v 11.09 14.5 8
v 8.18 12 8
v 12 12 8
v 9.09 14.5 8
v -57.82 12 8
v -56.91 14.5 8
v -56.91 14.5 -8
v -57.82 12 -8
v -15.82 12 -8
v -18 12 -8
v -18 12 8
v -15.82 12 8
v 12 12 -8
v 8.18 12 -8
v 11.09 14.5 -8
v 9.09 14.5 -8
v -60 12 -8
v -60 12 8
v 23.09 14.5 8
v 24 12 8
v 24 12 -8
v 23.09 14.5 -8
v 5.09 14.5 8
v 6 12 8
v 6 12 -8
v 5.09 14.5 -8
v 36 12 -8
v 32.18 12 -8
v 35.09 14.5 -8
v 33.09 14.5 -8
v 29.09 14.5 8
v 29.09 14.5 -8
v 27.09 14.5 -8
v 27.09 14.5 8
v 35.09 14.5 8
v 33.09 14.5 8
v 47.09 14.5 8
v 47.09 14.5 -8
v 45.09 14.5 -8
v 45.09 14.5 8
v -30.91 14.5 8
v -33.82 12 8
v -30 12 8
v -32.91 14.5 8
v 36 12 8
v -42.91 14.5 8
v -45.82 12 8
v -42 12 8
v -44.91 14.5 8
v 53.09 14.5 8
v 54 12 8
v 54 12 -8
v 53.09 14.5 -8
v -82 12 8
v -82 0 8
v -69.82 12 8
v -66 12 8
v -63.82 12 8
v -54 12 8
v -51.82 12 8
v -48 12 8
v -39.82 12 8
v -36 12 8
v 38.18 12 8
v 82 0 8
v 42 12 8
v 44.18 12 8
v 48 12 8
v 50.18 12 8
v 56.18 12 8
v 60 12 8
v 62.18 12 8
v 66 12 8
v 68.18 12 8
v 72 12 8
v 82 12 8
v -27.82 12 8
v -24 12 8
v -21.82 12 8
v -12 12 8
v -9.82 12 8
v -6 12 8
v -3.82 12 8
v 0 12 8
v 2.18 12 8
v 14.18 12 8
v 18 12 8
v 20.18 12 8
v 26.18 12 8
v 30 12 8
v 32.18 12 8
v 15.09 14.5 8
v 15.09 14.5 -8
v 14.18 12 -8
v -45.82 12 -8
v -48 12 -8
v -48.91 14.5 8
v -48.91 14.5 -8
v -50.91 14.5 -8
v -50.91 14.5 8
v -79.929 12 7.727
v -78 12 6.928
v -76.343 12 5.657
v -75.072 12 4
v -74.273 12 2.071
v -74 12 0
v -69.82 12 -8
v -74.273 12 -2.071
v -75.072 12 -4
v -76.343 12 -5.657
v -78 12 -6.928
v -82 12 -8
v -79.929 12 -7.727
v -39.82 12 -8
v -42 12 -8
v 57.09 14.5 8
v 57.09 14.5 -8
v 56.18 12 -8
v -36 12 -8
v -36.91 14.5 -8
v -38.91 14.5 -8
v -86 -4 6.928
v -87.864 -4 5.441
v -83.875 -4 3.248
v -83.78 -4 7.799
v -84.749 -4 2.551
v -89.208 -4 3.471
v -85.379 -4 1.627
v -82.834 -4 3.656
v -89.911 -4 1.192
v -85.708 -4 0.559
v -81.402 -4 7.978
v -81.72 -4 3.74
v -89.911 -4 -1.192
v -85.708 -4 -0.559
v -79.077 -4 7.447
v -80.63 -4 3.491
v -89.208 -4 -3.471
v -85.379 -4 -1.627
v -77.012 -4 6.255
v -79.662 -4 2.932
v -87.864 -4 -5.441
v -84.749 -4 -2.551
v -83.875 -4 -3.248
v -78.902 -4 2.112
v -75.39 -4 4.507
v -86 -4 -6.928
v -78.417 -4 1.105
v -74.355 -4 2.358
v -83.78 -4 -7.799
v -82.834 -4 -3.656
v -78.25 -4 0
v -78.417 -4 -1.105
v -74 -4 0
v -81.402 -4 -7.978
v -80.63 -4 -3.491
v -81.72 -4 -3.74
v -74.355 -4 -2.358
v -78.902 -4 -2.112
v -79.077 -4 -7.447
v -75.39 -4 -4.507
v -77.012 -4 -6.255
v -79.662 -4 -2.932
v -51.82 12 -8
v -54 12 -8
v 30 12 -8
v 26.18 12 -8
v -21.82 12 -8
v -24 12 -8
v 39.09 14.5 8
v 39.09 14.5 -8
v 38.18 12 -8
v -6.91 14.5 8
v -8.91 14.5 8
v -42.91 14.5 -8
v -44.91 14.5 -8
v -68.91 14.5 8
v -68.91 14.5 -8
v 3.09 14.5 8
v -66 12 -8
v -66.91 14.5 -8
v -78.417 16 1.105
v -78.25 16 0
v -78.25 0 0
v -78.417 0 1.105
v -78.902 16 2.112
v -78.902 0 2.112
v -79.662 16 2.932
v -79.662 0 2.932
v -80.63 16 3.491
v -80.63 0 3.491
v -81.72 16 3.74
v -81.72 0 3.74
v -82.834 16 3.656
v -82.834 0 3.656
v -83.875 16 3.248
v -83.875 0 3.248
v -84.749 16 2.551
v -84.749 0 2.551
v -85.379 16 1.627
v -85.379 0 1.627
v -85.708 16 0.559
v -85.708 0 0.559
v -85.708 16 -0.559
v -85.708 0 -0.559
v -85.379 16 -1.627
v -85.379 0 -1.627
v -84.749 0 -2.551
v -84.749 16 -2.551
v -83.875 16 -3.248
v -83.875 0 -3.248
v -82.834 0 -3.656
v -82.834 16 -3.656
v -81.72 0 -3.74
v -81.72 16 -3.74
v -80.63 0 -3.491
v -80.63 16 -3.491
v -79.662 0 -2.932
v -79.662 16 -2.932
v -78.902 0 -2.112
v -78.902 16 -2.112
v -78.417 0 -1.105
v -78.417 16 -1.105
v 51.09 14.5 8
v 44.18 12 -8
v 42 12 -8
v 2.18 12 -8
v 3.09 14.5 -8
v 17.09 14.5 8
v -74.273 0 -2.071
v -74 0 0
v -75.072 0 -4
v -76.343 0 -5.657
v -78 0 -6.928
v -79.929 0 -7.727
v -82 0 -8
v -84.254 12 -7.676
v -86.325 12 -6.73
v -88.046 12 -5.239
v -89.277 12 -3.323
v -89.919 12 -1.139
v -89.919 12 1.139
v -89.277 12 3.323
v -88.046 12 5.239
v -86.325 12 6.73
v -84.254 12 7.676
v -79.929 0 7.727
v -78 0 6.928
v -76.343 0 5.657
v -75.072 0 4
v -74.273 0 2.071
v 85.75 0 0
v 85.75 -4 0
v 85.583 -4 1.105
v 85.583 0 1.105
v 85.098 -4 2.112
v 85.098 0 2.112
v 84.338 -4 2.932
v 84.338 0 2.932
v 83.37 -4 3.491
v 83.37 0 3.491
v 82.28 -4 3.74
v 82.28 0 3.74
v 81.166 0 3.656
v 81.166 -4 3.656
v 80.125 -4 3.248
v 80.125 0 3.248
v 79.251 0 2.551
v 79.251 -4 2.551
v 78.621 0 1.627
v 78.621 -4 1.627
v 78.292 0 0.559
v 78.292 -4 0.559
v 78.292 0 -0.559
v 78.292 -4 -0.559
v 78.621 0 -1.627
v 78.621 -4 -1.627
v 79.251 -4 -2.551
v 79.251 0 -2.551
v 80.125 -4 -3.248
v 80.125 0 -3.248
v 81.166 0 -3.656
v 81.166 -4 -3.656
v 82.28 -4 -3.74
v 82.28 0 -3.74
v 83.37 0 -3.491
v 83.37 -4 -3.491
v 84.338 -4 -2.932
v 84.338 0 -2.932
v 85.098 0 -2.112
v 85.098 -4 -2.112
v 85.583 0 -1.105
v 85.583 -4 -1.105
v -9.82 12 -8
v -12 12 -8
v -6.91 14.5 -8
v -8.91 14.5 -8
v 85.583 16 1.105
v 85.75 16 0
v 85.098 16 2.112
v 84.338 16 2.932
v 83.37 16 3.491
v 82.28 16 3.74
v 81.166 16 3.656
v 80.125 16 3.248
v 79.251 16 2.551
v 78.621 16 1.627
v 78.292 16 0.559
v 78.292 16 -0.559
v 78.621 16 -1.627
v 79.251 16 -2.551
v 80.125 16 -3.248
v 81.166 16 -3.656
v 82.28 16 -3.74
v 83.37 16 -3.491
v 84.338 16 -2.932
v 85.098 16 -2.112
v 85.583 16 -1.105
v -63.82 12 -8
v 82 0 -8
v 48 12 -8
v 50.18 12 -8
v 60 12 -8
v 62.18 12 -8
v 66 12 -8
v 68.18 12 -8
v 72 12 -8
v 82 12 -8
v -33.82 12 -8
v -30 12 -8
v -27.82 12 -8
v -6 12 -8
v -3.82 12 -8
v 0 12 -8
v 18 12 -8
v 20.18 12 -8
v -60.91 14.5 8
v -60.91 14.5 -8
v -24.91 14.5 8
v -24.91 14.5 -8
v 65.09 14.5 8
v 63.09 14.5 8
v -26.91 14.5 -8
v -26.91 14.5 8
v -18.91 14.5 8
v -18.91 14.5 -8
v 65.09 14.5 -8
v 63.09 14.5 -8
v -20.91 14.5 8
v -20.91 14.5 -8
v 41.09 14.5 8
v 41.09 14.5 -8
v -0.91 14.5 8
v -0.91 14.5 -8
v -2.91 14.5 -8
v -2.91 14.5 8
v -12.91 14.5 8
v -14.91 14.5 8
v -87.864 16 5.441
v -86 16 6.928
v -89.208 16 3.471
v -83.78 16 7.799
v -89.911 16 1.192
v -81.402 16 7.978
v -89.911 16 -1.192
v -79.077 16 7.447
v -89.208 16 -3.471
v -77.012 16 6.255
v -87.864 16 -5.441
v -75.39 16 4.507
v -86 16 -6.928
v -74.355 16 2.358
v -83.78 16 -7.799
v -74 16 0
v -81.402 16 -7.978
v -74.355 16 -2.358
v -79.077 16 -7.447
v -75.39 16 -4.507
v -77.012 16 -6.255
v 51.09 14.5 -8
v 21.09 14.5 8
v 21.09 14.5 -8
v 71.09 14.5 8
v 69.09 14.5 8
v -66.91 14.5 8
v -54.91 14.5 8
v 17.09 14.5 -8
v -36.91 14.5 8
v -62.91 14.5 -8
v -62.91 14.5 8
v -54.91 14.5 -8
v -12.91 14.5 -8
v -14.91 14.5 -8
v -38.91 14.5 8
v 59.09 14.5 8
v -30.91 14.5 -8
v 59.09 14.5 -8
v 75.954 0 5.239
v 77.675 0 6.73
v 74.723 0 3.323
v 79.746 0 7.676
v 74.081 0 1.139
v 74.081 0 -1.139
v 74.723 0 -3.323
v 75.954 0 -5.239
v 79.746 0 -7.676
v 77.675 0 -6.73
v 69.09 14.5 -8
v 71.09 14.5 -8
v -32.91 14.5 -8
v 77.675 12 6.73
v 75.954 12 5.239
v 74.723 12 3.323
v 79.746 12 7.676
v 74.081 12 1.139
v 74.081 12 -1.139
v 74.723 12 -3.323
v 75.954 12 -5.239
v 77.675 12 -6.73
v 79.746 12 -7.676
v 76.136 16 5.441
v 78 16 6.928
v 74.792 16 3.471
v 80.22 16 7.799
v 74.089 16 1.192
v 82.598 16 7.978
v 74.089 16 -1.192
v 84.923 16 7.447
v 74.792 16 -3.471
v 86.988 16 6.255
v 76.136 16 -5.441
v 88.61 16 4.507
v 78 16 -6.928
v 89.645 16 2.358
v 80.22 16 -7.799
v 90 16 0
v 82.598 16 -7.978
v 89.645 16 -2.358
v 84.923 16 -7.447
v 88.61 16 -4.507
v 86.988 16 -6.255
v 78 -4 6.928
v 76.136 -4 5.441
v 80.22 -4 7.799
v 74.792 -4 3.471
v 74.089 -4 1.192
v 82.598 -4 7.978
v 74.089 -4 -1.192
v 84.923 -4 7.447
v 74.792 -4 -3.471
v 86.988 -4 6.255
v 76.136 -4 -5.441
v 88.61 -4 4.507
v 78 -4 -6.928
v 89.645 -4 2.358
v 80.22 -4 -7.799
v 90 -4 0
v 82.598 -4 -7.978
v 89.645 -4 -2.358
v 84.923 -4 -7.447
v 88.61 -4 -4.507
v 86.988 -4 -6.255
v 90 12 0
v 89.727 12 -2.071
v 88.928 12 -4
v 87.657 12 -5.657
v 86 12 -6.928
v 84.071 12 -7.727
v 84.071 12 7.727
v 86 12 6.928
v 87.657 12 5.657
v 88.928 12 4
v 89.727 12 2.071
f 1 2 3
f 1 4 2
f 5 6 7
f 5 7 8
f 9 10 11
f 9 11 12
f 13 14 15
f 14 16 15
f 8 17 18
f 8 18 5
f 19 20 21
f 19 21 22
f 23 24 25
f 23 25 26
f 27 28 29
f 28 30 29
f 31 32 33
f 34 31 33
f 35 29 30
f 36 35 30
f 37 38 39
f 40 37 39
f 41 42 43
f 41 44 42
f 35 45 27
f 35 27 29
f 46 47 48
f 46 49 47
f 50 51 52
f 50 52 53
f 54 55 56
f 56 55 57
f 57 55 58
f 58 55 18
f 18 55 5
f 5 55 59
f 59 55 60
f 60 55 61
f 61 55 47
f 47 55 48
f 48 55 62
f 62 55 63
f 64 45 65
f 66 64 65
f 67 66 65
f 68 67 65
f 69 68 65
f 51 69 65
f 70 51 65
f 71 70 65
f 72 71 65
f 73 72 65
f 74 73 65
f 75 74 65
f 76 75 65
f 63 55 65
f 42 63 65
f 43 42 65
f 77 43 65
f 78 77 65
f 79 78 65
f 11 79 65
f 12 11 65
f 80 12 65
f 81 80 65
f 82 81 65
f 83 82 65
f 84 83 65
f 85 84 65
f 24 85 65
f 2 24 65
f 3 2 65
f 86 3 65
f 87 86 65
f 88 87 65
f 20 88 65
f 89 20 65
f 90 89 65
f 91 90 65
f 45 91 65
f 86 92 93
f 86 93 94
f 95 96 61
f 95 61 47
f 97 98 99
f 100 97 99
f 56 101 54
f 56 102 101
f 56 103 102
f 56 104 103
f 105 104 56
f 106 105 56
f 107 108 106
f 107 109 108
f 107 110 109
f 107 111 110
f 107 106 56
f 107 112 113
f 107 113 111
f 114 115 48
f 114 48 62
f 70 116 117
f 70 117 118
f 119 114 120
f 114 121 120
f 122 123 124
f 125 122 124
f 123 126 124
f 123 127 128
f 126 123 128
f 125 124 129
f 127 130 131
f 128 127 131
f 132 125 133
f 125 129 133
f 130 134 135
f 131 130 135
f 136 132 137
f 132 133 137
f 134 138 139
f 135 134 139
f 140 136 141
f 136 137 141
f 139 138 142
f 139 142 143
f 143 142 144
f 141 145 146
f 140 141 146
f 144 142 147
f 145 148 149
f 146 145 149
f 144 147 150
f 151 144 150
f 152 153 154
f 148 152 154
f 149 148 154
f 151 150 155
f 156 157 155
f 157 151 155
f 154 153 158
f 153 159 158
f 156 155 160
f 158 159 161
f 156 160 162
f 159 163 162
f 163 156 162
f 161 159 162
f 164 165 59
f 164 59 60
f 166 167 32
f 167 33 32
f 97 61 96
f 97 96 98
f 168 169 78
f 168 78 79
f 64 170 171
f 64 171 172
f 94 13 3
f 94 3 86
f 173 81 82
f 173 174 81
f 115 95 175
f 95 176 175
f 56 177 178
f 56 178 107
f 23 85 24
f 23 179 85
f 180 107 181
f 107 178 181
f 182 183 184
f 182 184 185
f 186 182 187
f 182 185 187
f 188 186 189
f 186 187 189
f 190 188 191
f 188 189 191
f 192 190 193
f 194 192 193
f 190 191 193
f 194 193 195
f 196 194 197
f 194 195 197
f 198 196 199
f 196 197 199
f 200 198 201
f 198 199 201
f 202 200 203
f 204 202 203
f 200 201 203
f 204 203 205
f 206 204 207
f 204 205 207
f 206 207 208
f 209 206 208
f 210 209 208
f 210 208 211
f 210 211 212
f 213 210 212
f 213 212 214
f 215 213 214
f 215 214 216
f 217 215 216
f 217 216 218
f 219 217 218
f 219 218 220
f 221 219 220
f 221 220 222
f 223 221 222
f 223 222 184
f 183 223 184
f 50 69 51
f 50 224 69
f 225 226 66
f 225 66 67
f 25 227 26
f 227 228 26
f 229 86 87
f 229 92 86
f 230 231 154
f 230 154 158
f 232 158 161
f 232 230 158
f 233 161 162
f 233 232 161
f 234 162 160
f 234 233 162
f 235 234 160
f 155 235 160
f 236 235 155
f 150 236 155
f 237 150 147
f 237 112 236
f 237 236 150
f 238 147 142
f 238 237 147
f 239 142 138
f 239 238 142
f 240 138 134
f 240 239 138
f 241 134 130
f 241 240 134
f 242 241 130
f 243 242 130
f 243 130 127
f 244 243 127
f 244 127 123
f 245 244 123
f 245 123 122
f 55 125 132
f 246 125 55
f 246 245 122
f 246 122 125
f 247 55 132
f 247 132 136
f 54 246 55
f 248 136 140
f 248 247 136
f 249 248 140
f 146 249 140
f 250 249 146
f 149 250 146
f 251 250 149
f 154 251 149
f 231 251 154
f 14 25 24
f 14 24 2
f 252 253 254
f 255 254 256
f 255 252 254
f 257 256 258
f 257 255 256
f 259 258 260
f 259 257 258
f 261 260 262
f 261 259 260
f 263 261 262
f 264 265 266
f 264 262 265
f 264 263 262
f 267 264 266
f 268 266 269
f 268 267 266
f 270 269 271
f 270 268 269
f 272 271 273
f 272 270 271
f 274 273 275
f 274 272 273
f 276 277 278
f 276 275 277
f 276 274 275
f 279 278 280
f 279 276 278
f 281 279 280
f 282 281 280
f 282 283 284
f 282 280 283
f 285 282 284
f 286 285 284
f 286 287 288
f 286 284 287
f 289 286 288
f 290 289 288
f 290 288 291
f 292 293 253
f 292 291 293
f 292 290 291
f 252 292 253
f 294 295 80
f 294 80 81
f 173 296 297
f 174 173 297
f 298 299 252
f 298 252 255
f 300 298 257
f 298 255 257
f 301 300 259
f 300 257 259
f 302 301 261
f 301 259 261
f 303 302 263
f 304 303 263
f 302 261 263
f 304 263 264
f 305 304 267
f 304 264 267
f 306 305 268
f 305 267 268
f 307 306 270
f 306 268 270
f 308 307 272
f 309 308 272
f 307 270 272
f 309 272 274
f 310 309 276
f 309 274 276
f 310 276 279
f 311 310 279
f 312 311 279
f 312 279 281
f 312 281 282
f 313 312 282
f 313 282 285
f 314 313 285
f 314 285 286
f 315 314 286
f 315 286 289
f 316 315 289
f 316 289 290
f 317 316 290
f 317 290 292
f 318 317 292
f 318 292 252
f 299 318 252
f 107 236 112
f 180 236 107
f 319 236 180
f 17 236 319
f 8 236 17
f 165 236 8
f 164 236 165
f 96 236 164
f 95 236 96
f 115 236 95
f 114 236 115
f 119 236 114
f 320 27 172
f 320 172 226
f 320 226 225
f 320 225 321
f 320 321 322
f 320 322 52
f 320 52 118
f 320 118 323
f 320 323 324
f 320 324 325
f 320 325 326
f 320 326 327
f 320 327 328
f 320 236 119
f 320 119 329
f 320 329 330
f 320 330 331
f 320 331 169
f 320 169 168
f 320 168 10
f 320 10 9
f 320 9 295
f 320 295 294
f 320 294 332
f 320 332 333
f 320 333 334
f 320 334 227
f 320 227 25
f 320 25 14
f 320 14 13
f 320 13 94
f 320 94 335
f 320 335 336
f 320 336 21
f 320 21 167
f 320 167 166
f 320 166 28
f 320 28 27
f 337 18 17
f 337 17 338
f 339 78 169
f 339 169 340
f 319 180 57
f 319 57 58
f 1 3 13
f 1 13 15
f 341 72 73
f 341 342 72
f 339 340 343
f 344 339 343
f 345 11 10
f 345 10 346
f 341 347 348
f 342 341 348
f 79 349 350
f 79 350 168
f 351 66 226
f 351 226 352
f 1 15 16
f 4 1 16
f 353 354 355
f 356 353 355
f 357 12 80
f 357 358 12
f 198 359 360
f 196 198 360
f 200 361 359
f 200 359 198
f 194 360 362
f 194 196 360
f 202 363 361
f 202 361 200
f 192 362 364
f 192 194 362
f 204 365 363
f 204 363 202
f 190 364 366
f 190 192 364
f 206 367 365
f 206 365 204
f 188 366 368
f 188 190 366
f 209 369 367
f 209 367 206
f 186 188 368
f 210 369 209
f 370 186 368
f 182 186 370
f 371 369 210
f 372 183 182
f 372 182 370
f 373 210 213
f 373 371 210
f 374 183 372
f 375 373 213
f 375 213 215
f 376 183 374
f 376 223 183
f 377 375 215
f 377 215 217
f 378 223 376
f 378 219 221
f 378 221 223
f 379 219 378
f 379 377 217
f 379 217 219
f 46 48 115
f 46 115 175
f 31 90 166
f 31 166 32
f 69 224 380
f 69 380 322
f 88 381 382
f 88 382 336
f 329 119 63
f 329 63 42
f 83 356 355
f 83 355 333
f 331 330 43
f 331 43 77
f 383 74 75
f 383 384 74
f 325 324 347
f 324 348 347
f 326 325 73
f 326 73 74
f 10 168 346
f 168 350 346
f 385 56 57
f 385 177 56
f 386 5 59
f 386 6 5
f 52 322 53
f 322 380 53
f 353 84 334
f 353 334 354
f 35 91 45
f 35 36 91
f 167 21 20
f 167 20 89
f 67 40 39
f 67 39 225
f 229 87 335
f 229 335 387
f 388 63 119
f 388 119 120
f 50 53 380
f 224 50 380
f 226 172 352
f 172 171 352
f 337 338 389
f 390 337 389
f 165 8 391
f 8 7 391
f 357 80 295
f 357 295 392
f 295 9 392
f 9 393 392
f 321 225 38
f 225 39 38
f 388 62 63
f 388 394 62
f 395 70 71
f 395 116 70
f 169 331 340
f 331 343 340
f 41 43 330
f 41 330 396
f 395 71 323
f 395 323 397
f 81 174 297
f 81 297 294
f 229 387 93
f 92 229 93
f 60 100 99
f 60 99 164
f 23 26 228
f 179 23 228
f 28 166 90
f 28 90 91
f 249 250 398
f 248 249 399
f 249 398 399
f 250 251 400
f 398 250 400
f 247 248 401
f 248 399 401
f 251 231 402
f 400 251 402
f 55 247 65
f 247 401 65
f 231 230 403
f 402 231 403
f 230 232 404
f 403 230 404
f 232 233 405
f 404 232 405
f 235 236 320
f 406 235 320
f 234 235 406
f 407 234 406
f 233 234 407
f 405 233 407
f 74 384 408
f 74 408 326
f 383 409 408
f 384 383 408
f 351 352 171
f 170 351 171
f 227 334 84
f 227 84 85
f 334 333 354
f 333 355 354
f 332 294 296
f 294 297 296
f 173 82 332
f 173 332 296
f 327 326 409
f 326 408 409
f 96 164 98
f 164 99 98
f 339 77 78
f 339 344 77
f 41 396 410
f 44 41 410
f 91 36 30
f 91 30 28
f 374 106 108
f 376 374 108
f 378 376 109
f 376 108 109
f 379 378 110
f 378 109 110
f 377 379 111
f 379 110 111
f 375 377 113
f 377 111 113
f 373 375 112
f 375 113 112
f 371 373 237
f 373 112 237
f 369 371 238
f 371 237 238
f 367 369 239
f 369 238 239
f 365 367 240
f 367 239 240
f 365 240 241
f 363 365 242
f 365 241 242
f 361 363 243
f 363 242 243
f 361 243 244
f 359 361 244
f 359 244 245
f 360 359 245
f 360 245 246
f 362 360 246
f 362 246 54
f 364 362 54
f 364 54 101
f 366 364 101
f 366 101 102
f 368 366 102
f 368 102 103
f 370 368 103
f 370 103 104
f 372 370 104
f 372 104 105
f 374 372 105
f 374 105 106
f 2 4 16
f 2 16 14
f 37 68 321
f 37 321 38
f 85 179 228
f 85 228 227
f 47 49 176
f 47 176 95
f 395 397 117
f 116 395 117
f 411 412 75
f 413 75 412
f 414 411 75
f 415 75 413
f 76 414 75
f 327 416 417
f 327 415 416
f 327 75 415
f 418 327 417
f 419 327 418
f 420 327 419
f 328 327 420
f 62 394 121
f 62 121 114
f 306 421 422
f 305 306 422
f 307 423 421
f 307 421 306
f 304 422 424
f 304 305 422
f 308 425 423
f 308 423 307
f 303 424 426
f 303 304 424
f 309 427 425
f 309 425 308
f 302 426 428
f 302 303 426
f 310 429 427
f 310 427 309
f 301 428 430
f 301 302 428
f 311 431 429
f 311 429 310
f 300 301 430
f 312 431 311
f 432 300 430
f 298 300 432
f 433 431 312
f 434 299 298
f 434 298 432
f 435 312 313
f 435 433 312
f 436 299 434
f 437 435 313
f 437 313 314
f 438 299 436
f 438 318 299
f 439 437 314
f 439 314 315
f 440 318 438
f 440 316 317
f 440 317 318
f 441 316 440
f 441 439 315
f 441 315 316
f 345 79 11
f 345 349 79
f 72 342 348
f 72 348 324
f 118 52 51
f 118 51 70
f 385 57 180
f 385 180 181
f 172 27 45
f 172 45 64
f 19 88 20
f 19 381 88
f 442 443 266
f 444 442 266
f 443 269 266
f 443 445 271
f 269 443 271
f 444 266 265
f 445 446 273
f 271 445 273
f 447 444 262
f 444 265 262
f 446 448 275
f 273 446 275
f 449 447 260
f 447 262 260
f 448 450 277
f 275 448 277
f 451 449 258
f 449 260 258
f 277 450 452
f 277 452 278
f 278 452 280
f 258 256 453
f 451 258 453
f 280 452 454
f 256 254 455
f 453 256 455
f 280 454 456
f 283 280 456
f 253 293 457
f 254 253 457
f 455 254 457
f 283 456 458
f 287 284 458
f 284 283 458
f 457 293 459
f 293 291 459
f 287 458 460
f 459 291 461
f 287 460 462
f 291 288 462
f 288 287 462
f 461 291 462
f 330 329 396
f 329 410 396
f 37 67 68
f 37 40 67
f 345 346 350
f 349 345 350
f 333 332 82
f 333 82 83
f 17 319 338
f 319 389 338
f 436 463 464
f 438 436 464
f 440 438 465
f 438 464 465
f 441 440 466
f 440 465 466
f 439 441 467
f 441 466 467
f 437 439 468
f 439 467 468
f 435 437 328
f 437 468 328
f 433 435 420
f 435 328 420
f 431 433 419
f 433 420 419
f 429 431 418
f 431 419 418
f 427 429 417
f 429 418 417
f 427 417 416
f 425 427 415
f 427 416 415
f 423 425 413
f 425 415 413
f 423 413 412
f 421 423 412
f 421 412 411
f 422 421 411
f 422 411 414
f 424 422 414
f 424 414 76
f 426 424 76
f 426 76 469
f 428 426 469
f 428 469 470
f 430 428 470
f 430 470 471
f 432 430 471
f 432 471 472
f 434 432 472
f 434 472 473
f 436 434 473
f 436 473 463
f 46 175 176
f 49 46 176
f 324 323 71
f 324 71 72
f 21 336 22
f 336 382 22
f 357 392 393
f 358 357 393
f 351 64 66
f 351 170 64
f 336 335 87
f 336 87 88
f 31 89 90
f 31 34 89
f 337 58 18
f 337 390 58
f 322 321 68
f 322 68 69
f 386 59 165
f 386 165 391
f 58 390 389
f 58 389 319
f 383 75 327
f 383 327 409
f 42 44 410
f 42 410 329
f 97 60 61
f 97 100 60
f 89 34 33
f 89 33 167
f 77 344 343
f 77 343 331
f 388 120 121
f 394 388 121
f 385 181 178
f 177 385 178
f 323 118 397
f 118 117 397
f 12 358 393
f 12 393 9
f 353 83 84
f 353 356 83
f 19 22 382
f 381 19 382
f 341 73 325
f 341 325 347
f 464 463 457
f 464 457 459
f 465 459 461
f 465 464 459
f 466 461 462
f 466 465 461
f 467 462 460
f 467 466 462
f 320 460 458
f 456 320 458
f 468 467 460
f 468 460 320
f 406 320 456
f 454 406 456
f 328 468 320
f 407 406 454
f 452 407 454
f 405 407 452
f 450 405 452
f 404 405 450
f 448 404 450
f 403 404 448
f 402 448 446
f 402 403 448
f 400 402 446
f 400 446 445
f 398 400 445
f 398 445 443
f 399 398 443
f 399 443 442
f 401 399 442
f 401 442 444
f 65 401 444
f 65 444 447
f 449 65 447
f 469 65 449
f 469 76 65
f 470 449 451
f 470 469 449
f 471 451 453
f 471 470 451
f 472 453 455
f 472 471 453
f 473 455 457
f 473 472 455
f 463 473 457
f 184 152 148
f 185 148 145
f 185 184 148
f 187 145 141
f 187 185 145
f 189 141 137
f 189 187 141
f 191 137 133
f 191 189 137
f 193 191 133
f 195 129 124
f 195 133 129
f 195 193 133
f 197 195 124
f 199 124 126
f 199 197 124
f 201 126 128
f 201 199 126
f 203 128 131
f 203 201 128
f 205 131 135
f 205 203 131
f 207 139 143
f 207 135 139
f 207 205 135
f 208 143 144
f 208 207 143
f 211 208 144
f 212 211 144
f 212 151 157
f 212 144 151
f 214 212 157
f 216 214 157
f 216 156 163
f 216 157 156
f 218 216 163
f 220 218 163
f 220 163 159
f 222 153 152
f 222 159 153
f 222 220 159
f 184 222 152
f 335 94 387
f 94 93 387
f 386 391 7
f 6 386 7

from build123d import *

# Parameters (mm, degrees)
SKETCH1_W                = 164
SKETCH1_H                = 16
BOSS_EXTRUDE1_DEPTH      = 12
SKETCH2_R                = 8
BOSS_EXTRUDE2_DEPTH      = 4
BOSS_EXTRUDE2_DEPTH_BACK = 16
BOSS_EXTRUDE3_DEPTH      = 16
LPATTERN1_COUNT          = 24
LPATTERN1_PITCH          = 6
SKETCH4_R                = 3.75
CUT_EXTRUDE1_DEPTH       = 5
CUT_EXTRUDE1_DEPTH_BACK  = 17


with BuildPart() as part:
    # Sketch1 → Boss-Extrude1 (new body)
    with BuildSketch(Plane(origin=(0, 0, 0), x_dir=(1, 0, 0), z_dir=(0, 1, 0))):
        Rectangle(SKETCH1_W, SKETCH1_H)
    extrude(amount=BOSS_EXTRUDE1_DEPTH)

    # Sketch2 → Boss-Extrude2 (add, two sides)
    with BuildSketch(Plane(origin=(0, 12, 0), x_dir=(1, 0, 0), z_dir=(0, 1, 0))) as boss_extrude2_sk:
        with Locations((-82, 0)):
            Circle(SKETCH2_R)
        with Locations((82, 0)):
            Circle(SKETCH2_R)
    extrude(amount=BOSS_EXTRUDE2_DEPTH)
    extrude(boss_extrude2_sk.sketch, amount=-BOSS_EXTRUDE2_DEPTH_BACK)

    # Sketch3 → Boss-Extrude3 (add)
    with BuildSketch(Plane.XY.offset(8)):
        Polygon((68.180148829, 12), (72, 12), (71.090074414, 14.5), (69.090074414, 14.5), align=None)
    boss_extrude3 = extrude(amount=-BOSS_EXTRUDE3_DEPTH)

    # LPattern1: Boss-Extrude3 ×24
    with Locations(*[(-i * LPATTERN1_PITCH, 0, 0) for i in range(1, LPATTERN1_COUNT)]):
        add(boss_extrude3)

    # Sketch4 → Cut-Extrude1 (cut, two sides)
    with BuildSketch(Plane.XZ) as cut_extrude1_sk:
        with Locations((-82, 0)):
            Circle(SKETCH4_R)
        with Locations((82, 0)):
            Circle(SKETCH4_R)
    extrude(amount=CUT_EXTRUDE1_DEPTH, mode=Mode.SUBTRACT)
    extrude(cut_extrude1_sk.sketch, amount=-CUT_EXTRUDE1_DEPTH_BACK, mode=Mode.SUBTRACT)


solid = part.part
